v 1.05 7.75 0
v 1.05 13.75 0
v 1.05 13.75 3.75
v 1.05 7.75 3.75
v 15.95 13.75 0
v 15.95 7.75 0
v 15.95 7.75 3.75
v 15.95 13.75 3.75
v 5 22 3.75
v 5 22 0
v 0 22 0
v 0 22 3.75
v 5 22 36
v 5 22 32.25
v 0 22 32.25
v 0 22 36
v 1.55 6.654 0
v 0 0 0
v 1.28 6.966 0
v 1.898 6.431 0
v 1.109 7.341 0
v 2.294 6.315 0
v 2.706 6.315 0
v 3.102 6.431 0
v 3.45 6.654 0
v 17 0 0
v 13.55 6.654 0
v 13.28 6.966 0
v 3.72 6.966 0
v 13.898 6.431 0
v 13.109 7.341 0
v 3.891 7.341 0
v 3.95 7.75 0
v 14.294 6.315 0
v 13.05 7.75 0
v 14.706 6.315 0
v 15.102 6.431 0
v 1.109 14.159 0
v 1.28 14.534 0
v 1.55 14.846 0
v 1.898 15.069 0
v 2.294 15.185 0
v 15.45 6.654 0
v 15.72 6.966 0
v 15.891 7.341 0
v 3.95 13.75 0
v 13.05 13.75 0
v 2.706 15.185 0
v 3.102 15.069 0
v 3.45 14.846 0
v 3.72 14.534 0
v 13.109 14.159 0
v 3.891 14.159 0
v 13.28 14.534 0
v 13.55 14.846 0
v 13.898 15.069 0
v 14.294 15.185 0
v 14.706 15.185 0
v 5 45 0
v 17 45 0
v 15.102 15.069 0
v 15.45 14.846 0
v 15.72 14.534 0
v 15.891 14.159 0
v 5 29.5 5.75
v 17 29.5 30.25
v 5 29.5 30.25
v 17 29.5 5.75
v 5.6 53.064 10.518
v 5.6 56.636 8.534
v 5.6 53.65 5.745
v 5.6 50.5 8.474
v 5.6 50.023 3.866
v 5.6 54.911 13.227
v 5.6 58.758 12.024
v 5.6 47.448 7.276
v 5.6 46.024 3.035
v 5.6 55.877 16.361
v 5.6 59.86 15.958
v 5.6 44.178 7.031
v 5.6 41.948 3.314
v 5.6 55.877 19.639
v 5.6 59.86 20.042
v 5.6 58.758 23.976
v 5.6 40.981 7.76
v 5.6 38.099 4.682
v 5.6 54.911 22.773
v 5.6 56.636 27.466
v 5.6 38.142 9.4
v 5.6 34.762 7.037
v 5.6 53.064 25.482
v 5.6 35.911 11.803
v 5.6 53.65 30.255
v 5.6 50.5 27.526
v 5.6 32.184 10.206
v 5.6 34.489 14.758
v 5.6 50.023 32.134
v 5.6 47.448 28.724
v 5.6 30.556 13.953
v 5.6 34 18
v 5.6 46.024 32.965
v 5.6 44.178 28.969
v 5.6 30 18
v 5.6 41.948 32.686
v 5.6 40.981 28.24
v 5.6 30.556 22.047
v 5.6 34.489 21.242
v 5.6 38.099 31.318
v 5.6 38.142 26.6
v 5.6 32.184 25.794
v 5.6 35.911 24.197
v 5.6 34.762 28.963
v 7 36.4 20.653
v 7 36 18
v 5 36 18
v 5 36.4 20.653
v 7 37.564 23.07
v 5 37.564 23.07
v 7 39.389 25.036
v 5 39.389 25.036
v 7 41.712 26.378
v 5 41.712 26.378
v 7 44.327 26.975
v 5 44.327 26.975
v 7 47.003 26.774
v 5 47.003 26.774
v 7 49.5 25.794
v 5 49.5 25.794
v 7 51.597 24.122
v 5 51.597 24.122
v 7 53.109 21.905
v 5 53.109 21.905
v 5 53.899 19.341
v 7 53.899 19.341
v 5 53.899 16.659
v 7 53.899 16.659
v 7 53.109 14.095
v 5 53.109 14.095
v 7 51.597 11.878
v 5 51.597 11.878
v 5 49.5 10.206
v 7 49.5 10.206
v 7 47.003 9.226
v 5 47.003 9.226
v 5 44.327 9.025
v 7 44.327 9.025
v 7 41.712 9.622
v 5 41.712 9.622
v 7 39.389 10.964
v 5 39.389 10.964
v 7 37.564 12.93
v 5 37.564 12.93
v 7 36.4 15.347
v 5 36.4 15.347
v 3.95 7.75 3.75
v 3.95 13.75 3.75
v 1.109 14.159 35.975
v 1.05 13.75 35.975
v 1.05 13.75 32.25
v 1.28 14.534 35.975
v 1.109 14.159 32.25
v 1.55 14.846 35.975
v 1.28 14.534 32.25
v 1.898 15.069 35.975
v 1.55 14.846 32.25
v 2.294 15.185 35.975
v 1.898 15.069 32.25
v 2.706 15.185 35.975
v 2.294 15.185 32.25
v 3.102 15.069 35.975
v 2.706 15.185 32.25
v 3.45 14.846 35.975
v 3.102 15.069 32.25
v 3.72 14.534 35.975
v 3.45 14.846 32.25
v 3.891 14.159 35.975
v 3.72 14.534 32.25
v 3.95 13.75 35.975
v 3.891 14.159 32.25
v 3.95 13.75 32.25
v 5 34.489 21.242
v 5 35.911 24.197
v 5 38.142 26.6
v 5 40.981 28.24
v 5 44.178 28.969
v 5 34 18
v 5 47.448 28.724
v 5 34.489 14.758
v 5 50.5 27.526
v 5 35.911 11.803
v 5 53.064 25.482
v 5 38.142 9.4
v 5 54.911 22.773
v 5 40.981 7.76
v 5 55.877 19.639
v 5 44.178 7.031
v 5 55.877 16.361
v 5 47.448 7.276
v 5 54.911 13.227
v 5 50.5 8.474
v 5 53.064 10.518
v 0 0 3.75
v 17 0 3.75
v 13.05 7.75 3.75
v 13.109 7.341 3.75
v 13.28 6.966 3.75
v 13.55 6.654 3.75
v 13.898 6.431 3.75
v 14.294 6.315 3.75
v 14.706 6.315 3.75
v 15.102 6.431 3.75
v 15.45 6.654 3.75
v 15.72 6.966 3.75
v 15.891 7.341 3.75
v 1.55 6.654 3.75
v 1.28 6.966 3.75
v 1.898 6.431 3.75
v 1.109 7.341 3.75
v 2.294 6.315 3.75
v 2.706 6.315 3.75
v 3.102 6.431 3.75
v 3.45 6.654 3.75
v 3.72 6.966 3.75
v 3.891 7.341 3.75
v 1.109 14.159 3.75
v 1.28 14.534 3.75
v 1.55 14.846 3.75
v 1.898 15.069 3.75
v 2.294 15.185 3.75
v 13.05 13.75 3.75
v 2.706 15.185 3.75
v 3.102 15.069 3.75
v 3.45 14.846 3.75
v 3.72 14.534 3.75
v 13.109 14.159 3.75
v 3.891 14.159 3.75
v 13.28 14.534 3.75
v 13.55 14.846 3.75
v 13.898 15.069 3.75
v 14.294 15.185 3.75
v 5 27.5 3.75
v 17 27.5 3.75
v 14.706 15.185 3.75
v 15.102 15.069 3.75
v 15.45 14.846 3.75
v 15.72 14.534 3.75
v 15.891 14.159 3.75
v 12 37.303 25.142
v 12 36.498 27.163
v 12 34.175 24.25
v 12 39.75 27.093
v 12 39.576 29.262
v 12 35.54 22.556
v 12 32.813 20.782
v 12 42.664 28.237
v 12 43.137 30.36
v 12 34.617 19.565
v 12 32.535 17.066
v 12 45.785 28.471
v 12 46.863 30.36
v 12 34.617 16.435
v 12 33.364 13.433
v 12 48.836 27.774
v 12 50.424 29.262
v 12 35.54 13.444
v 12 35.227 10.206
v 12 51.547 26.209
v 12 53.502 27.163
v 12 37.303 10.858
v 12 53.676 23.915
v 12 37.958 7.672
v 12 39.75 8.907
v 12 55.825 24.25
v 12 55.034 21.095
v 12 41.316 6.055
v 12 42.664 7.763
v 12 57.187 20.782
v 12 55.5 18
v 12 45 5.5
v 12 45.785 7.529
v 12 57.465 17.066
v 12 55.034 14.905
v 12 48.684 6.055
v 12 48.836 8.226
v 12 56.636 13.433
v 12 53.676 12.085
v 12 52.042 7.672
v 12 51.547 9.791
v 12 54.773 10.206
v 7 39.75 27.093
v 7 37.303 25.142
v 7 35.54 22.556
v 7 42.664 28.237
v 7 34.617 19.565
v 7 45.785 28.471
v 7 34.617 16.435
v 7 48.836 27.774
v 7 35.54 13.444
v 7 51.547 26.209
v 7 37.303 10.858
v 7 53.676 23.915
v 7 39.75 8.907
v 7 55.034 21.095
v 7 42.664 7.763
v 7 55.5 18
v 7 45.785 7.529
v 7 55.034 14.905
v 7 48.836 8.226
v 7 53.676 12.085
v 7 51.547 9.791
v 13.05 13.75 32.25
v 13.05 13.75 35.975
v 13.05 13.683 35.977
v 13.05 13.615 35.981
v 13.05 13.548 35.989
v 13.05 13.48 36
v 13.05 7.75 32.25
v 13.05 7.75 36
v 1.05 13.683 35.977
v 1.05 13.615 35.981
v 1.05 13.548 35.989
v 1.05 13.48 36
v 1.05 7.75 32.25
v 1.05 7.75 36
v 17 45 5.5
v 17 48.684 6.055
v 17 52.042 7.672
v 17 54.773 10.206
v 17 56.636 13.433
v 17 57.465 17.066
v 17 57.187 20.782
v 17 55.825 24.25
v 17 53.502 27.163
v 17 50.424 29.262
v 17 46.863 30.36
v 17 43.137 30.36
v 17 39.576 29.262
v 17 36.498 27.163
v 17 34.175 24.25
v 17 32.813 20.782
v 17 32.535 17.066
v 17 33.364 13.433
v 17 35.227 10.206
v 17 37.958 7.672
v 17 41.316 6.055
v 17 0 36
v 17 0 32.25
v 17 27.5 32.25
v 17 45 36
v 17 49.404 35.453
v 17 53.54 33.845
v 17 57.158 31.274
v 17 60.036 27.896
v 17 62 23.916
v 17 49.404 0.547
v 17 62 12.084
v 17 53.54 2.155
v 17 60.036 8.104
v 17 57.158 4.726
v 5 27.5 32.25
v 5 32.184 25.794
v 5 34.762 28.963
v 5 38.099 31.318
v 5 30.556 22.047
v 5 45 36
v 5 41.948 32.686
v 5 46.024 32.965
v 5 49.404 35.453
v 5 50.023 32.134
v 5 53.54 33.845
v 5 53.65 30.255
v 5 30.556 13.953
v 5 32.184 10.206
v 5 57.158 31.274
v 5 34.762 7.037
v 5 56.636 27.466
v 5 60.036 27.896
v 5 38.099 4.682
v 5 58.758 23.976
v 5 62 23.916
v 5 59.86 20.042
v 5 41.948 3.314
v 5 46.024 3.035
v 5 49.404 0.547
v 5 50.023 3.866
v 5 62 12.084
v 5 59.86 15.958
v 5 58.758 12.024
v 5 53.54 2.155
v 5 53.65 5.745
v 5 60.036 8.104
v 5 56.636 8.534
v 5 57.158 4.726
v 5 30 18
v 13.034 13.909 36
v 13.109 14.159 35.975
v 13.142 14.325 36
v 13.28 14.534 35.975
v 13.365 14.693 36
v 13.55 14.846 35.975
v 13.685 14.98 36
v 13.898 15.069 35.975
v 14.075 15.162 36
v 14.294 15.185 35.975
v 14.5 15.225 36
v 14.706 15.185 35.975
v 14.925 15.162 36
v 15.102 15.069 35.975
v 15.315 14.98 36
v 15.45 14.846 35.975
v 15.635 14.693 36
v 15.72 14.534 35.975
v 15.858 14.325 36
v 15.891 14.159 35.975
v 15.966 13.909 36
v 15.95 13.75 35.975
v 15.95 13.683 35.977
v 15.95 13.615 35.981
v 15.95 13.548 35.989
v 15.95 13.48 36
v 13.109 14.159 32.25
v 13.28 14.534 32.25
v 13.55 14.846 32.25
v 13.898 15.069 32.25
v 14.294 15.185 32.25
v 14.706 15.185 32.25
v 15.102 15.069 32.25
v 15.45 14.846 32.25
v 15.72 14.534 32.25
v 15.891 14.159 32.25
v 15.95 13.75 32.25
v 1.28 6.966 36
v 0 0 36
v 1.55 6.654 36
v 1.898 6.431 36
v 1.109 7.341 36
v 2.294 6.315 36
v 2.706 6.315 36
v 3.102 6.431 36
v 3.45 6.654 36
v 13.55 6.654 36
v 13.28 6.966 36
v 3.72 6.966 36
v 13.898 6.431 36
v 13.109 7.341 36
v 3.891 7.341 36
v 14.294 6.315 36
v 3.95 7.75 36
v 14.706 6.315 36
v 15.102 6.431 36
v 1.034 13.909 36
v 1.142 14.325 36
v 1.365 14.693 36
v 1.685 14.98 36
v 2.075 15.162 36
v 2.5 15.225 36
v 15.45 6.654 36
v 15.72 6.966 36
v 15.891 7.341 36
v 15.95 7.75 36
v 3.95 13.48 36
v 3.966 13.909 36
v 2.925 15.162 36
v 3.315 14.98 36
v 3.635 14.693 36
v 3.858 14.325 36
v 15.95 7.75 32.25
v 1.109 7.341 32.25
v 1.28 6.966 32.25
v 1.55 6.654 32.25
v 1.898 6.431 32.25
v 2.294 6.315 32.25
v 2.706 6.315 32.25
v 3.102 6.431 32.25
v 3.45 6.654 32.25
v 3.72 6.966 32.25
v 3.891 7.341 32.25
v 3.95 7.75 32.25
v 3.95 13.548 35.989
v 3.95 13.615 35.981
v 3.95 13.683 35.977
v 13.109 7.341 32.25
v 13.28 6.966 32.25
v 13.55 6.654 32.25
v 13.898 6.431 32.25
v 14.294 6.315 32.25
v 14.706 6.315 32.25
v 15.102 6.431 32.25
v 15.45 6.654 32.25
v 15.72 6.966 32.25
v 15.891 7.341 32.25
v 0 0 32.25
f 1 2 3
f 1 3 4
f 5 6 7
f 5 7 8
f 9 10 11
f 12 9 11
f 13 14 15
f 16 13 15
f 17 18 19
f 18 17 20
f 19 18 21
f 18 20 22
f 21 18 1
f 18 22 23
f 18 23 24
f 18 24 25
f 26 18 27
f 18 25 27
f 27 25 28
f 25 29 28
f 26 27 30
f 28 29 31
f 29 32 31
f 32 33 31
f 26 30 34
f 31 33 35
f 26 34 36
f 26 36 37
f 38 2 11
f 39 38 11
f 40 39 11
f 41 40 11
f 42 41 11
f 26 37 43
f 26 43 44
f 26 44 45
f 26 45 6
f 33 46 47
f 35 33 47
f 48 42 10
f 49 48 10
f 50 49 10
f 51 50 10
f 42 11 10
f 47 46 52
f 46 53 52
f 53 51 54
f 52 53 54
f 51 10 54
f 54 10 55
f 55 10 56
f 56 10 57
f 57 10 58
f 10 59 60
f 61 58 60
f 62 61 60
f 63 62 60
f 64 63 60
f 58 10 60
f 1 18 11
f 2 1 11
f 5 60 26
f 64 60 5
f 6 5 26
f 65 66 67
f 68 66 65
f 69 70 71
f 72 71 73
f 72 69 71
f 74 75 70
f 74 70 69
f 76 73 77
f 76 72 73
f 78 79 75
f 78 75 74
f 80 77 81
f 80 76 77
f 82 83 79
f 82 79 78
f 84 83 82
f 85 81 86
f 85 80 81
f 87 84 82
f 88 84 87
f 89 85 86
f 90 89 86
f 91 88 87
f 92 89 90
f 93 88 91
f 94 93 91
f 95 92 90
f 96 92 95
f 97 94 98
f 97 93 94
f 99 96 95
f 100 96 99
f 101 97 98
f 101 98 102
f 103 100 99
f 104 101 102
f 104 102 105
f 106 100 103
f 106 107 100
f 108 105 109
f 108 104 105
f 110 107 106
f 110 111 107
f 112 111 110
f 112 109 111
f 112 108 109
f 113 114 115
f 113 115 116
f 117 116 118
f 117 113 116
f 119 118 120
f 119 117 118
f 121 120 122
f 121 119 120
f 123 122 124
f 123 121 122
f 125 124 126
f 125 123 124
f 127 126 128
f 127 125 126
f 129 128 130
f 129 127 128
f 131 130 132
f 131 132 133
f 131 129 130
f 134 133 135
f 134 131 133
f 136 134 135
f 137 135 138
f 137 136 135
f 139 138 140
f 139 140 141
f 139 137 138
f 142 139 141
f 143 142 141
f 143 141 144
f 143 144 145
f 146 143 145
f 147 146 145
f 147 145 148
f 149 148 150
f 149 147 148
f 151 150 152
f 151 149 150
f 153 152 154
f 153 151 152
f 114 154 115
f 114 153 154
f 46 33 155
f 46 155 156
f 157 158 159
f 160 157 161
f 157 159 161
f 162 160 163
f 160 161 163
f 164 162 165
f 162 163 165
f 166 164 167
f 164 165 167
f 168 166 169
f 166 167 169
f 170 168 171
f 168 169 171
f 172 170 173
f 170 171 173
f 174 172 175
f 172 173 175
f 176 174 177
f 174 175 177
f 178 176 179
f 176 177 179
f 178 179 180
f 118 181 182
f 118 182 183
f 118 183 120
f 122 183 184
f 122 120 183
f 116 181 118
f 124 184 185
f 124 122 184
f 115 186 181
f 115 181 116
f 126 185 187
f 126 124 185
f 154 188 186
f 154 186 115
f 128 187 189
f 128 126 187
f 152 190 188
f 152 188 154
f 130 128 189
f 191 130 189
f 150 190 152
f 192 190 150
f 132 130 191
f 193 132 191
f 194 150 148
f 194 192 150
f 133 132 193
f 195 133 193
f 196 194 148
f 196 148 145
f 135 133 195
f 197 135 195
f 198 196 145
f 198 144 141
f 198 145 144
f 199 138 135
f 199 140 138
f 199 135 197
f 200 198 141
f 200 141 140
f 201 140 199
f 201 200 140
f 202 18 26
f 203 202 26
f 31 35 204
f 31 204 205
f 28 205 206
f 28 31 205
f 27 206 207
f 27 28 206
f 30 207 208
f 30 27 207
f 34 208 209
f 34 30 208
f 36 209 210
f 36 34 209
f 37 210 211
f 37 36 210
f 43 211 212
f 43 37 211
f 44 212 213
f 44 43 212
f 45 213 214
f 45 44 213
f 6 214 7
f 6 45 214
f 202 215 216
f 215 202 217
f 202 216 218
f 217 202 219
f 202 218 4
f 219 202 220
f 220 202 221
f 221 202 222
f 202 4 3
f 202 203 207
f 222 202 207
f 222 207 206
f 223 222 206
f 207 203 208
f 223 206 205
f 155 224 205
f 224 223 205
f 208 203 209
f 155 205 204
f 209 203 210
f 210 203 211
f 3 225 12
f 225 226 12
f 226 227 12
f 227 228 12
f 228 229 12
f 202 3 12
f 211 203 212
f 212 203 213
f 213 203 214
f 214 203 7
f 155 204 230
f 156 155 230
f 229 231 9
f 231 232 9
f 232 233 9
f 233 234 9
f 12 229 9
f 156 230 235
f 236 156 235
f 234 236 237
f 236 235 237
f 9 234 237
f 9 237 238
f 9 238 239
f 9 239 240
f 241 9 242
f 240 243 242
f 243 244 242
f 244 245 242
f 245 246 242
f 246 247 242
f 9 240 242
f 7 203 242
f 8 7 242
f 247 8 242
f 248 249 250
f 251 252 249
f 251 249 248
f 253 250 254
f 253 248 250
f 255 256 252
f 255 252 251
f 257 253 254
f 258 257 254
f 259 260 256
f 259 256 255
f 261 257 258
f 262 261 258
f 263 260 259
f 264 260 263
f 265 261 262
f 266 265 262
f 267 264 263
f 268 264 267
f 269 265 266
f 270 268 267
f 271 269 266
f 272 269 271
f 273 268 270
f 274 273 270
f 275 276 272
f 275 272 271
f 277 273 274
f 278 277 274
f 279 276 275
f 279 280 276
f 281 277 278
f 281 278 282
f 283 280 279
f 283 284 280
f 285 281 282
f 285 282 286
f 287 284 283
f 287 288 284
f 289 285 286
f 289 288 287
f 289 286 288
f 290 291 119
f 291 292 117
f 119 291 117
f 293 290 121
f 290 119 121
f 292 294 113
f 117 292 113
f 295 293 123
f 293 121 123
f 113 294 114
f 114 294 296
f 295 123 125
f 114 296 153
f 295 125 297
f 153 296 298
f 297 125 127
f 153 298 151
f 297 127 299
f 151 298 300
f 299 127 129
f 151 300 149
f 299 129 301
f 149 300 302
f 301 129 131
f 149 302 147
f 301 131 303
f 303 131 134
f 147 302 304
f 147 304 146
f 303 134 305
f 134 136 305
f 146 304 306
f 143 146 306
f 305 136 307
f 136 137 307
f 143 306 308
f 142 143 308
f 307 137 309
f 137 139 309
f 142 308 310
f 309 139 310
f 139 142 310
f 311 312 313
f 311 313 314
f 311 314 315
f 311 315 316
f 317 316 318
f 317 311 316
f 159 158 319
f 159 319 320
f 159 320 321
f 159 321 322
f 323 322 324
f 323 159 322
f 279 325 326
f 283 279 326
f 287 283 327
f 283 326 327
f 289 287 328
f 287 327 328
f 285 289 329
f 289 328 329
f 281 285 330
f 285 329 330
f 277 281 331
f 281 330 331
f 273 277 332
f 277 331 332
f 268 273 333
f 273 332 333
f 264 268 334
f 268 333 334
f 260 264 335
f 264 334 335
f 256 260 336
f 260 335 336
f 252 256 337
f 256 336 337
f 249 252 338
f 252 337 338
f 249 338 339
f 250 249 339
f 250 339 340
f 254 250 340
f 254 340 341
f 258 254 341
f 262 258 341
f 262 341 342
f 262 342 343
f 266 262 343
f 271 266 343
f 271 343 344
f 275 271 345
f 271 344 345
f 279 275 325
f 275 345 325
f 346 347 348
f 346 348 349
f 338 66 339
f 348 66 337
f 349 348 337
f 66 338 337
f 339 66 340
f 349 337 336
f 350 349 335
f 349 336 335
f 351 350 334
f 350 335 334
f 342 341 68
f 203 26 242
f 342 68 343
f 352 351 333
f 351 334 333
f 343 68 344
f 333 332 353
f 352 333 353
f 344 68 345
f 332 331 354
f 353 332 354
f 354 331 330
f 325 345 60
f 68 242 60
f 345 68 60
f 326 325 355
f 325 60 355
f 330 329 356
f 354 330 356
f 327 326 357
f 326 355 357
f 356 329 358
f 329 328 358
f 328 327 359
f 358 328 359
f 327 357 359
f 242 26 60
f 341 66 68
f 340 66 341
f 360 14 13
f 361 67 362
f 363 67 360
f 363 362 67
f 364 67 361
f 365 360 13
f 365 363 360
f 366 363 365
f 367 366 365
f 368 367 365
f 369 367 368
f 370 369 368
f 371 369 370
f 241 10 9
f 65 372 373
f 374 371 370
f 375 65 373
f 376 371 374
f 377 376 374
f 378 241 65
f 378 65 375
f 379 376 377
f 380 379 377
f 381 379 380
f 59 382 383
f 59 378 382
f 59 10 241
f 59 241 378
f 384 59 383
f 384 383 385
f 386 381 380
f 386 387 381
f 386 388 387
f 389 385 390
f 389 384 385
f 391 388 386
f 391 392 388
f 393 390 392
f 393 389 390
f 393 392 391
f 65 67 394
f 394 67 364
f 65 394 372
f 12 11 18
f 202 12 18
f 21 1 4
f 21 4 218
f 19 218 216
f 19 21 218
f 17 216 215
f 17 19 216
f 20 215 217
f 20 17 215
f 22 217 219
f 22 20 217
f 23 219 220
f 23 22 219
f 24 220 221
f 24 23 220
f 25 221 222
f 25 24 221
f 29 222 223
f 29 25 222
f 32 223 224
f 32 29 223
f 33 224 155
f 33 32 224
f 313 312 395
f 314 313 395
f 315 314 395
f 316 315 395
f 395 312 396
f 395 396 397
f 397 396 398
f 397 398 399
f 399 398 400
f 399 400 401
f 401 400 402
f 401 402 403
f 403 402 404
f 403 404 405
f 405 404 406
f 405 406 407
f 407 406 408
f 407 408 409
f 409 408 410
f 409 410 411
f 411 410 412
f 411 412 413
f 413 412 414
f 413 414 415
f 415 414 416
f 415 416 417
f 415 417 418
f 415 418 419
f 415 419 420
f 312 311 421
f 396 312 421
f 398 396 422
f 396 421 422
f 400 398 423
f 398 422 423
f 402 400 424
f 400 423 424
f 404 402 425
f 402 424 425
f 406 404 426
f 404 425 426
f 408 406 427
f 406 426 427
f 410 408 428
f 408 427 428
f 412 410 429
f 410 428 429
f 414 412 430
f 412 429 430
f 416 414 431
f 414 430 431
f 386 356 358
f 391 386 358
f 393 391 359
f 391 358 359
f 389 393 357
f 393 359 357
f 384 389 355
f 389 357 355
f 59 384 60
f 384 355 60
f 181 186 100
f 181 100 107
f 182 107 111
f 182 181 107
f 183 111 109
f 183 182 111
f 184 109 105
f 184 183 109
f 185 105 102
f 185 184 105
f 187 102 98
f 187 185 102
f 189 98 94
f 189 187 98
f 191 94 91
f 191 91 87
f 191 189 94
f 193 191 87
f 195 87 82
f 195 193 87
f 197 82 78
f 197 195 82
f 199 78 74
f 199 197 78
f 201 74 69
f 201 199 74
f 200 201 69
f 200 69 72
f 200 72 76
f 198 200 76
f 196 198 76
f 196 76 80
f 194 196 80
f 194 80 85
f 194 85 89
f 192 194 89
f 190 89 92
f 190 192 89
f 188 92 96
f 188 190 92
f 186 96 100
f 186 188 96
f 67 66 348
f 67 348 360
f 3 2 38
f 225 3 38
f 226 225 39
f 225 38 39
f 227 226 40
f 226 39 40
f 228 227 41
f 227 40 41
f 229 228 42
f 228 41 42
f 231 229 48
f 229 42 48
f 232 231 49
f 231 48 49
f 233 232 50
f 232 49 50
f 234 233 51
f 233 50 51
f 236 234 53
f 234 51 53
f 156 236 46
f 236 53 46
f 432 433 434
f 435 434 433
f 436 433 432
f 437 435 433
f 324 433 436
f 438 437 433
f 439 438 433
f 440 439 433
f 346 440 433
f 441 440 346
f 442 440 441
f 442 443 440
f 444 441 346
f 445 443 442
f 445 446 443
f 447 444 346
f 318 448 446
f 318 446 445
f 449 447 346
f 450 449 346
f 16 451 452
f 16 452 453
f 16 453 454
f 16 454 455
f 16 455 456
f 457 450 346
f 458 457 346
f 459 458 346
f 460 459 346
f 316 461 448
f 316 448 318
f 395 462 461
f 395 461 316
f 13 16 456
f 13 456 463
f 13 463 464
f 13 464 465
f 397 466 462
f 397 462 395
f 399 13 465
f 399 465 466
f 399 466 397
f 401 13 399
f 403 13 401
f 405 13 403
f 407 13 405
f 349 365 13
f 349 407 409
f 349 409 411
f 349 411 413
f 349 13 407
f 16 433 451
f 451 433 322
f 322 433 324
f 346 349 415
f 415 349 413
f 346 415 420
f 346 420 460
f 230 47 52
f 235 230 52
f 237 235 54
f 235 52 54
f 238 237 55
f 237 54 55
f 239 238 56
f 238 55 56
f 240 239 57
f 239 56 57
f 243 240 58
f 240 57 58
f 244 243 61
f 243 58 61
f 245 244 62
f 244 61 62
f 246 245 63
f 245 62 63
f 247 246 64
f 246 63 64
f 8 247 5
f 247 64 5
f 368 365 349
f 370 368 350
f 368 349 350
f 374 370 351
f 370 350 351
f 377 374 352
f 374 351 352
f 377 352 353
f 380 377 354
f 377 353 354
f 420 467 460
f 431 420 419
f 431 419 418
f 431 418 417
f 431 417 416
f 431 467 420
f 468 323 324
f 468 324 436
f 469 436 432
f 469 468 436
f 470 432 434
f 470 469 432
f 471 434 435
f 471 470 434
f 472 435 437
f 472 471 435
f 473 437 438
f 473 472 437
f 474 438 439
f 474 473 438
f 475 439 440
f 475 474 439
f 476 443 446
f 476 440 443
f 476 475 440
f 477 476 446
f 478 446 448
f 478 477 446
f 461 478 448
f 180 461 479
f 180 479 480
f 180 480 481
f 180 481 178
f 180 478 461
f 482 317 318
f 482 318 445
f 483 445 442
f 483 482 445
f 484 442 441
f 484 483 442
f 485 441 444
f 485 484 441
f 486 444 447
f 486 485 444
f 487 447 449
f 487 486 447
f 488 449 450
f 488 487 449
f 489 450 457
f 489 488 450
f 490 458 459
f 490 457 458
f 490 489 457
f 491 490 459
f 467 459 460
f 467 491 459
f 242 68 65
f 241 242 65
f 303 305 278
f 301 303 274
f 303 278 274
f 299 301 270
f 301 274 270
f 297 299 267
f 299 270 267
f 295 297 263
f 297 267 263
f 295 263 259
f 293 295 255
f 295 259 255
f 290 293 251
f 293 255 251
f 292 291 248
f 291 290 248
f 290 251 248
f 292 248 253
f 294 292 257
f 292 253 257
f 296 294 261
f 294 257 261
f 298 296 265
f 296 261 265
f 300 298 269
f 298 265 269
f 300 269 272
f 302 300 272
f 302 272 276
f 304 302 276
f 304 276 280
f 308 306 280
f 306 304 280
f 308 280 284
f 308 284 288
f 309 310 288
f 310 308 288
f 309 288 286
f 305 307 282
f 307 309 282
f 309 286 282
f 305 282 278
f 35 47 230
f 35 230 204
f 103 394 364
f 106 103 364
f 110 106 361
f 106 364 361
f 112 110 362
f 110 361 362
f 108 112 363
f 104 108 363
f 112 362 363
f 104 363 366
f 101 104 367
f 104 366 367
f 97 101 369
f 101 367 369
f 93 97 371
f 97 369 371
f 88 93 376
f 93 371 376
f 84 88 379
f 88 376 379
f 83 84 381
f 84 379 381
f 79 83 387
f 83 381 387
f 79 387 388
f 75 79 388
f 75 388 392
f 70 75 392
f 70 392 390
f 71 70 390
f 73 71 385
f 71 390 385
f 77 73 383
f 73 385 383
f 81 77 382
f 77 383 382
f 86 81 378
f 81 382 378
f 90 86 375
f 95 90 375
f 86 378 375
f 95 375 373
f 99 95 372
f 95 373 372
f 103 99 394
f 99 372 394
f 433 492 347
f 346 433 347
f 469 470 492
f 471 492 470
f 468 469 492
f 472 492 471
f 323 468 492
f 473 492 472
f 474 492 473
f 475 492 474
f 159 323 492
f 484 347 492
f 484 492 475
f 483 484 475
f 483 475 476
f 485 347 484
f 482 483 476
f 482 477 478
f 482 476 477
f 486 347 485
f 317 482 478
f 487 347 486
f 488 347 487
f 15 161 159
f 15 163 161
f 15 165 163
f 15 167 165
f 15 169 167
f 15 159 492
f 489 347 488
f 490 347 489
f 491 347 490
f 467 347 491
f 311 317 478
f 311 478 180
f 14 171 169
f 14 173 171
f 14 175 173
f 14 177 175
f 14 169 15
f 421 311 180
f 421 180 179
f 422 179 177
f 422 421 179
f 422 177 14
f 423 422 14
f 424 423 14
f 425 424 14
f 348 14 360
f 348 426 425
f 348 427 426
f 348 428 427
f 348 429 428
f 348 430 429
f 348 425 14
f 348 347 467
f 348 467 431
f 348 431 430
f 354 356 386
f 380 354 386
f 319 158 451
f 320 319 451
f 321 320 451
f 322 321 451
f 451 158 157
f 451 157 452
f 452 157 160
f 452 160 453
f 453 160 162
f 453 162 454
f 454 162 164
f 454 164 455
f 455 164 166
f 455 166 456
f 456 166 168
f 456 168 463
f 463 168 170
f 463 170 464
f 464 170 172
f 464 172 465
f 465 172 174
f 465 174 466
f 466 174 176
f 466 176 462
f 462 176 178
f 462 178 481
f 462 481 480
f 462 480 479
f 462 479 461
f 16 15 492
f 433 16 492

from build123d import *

# Parameters (mm, degrees)
BOSS_EXTRUDE1_DEPTH              = 36
SKETCH2_R                        = 10.5
CUT_EXTRUDE1_DEPTH               = 74.681748079
SKETCH3_W                        = 28.5
SKETCH3_H                        = 29.5
CUT_EXTRUDE2_DEPTH               = 74.681748079
CHAMFER1_SIZE                    = 2
BOSS_EXTRUDE2_START              = -2
SKETCH6_R                        = 10.5
SKETCH6_R_2                      = 9
BOSS_EXTRUDE2_DEPTH              = 2
SKETCH10_R                       = 15
SKETCH10_R_2                     = 11
CUT_EXTRUDE4_DEPTH               = 0.6
SKETCH11_R                       = 12.5
CUT_EXTRUDE5_DEPTH               = 5
M2_5_CLEARANCE_HOLE1_D           = 2.9
M2_5_CLEARANCE_HOLE1_CSINK_D     = 2.95
M2_5_CLEARANCE_HOLE1_CSINK_ANGLE = 90
CUT_EXTRUDE6_DEPTH               = 74.681748079
CUT_EXTRUDE7_DEPTH               = 74.681748079


with BuildPart() as part:
    # Sketch1 → Boss-Extrude1 (new body)
    with BuildSketch(Plane.XY):
        Polygon((0, 0), (17, 0), (17, 29), (17, 62), (5, 62), (5, 22), (0, 22), align=None)
    extrude(amount=BOSS_EXTRUDE1_DEPTH)

    # Sketch2 → Cut-Extrude1 (cut, through all)
    with BuildSketch(Plane(origin=(17, 0, 0), x_dir=(0, 0, -1), z_dir=(1, 0, 0))):
        with Locations(Location((-18, 45, 0), (0, 0, 90))):
            Circle(SKETCH2_R)
    extrude(amount=-CUT_EXTRUDE1_DEPTH, mode=Mode.SUBTRACT)

    # Sketch3 → Cut-Extrude2 (cut, through all)
    with BuildSketch(Plane(origin=(17, 0, 0), x_dir=(0, 0, -1), z_dir=(1, 0, 0))):
        with Locations((-18, 14.75)):
            Rectangle(SKETCH3_W, SKETCH3_H)
    extrude(amount=-CUT_EXTRUDE2_DEPTH, mode=Mode.SUBTRACT)

    # Chamfer1
    chamfer1_edges = [part.edges().sort_by_distance(p)[0] for p in [
        (11, 29.5, 32.25),
        (11, 29.5, 3.75),
    ]]
    chamfer(chamfer1_edges, length=CHAMFER1_SIZE)

    # Sketch6 → Boss-Extrude2 (add)
    with BuildSketch(Plane.ZY.offset(-5).offset(BOSS_EXTRUDE2_START)):
        with Locations(Location((18, 45, 0), (0, 0, 90))):
            Circle(SKETCH6_R)
        with Locations(Location((18, 45, 0), (0, 0, 270))):
            Circle(SKETCH6_R_2, mode=Mode.SUBTRACT)
    extrude(amount=BOSS_EXTRUDE2_DEPTH)

    # Sketch10 → Cut-Extrude4 (cut)
    with BuildSketch(Plane.ZY.offset(-5)):
        with Locations(Location((18, 45, 0), (0, 0, 270))):
            Circle(SKETCH10_R)
        with Locations(Location((18, 45, 0), (0, 0, 270))):
            Circle(SKETCH10_R_2, mode=Mode.SUBTRACT)
    extrude(amount=-CUT_EXTRUDE4_DEPTH, mode=Mode.SUBTRACT)

    # Sketch11 → Cut-Extrude5 (cut)
    with BuildSketch(Plane(origin=(17, 0, 0), x_dir=(0, 0, -1), z_dir=(1, 0, 0))):
        with Locations((-18, 45)):
            Circle(SKETCH11_R)
    extrude(amount=-CUT_EXTRUDE5_DEPTH, mode=Mode.SUBTRACT)

    # M2.5 Clearance Hole1 (through all)
    with Locations(Plane.XY.offset(36)):
        with Locations((14.5, 13.75), (2.5, 13.75)):
            CounterSinkHole(M2_5_CLEARANCE_HOLE1_D / 2, M2_5_CLEARANCE_HOLE1_CSINK_D / 2, counter_sink_angle=M2_5_CLEARANCE_HOLE1_CSINK_ANGLE)

    # Sketch15 → Cut-Extrude6 (cut, through all)
    with BuildSketch(Plane(origin=(0, 0, 0), x_dir=(-1, 0, 0), z_dir=(0, 0, -1))):
        with BuildLine():
            Line((-13.05, 13.75), (-13.05, 7.75))
            ThreePointArc((-13.05, 7.75), (-14.5, 6.3), (-15.95, 7.75))
            Line((-15.95, 7.75), (-15.95, 13.75))
            ThreePointArc((-15.95, 13.75), (-14.5, 15.2), (-13.05, 13.75))
        make_face()
        with BuildLine():
            Line((-1.05, 13.75), (-1.05, 7.75))
            ThreePointArc((-1.05, 7.75), (-2.5, 6.3), (-3.95, 7.75))
            Line((-3.95, 7.75), (-3.95, 13.75))
            ThreePointArc((-3.95, 13.75), (-2.5, 15.2), (-1.05, 13.75))
        make_face()
    extrude(amount=-CUT_EXTRUDE6_DEPTH, mode=Mode.SUBTRACT)

    # Sketch17 → Cut-Extrude7 (cut, through all)
    with BuildSketch(Plane(origin=(17, 0, 0), x_dir=(0, 0, -1), z_dir=(1, 0, 0))):
        with BuildLine():
            Line((-23.916079783, 62), (-36, 62))
            Line((-36, 62), (-36, 45))
            ThreePointArc((-36, 45), (-32.671220742, 55.428580054), (-23.916079783, 62))
        make_face()
        with BuildLine():
            Line((0, 62), (-12.083920217, 62))
            ThreePointArc((-12.083920217, 62), (-3.328779258, 55.428580054), (0, 45))
            Line((0, 45), (0, 62))
        make_face()
    extrude(amount=-CUT_EXTRUDE7_DEPTH, mode=Mode.SUBTRACT)


solid = part.part
